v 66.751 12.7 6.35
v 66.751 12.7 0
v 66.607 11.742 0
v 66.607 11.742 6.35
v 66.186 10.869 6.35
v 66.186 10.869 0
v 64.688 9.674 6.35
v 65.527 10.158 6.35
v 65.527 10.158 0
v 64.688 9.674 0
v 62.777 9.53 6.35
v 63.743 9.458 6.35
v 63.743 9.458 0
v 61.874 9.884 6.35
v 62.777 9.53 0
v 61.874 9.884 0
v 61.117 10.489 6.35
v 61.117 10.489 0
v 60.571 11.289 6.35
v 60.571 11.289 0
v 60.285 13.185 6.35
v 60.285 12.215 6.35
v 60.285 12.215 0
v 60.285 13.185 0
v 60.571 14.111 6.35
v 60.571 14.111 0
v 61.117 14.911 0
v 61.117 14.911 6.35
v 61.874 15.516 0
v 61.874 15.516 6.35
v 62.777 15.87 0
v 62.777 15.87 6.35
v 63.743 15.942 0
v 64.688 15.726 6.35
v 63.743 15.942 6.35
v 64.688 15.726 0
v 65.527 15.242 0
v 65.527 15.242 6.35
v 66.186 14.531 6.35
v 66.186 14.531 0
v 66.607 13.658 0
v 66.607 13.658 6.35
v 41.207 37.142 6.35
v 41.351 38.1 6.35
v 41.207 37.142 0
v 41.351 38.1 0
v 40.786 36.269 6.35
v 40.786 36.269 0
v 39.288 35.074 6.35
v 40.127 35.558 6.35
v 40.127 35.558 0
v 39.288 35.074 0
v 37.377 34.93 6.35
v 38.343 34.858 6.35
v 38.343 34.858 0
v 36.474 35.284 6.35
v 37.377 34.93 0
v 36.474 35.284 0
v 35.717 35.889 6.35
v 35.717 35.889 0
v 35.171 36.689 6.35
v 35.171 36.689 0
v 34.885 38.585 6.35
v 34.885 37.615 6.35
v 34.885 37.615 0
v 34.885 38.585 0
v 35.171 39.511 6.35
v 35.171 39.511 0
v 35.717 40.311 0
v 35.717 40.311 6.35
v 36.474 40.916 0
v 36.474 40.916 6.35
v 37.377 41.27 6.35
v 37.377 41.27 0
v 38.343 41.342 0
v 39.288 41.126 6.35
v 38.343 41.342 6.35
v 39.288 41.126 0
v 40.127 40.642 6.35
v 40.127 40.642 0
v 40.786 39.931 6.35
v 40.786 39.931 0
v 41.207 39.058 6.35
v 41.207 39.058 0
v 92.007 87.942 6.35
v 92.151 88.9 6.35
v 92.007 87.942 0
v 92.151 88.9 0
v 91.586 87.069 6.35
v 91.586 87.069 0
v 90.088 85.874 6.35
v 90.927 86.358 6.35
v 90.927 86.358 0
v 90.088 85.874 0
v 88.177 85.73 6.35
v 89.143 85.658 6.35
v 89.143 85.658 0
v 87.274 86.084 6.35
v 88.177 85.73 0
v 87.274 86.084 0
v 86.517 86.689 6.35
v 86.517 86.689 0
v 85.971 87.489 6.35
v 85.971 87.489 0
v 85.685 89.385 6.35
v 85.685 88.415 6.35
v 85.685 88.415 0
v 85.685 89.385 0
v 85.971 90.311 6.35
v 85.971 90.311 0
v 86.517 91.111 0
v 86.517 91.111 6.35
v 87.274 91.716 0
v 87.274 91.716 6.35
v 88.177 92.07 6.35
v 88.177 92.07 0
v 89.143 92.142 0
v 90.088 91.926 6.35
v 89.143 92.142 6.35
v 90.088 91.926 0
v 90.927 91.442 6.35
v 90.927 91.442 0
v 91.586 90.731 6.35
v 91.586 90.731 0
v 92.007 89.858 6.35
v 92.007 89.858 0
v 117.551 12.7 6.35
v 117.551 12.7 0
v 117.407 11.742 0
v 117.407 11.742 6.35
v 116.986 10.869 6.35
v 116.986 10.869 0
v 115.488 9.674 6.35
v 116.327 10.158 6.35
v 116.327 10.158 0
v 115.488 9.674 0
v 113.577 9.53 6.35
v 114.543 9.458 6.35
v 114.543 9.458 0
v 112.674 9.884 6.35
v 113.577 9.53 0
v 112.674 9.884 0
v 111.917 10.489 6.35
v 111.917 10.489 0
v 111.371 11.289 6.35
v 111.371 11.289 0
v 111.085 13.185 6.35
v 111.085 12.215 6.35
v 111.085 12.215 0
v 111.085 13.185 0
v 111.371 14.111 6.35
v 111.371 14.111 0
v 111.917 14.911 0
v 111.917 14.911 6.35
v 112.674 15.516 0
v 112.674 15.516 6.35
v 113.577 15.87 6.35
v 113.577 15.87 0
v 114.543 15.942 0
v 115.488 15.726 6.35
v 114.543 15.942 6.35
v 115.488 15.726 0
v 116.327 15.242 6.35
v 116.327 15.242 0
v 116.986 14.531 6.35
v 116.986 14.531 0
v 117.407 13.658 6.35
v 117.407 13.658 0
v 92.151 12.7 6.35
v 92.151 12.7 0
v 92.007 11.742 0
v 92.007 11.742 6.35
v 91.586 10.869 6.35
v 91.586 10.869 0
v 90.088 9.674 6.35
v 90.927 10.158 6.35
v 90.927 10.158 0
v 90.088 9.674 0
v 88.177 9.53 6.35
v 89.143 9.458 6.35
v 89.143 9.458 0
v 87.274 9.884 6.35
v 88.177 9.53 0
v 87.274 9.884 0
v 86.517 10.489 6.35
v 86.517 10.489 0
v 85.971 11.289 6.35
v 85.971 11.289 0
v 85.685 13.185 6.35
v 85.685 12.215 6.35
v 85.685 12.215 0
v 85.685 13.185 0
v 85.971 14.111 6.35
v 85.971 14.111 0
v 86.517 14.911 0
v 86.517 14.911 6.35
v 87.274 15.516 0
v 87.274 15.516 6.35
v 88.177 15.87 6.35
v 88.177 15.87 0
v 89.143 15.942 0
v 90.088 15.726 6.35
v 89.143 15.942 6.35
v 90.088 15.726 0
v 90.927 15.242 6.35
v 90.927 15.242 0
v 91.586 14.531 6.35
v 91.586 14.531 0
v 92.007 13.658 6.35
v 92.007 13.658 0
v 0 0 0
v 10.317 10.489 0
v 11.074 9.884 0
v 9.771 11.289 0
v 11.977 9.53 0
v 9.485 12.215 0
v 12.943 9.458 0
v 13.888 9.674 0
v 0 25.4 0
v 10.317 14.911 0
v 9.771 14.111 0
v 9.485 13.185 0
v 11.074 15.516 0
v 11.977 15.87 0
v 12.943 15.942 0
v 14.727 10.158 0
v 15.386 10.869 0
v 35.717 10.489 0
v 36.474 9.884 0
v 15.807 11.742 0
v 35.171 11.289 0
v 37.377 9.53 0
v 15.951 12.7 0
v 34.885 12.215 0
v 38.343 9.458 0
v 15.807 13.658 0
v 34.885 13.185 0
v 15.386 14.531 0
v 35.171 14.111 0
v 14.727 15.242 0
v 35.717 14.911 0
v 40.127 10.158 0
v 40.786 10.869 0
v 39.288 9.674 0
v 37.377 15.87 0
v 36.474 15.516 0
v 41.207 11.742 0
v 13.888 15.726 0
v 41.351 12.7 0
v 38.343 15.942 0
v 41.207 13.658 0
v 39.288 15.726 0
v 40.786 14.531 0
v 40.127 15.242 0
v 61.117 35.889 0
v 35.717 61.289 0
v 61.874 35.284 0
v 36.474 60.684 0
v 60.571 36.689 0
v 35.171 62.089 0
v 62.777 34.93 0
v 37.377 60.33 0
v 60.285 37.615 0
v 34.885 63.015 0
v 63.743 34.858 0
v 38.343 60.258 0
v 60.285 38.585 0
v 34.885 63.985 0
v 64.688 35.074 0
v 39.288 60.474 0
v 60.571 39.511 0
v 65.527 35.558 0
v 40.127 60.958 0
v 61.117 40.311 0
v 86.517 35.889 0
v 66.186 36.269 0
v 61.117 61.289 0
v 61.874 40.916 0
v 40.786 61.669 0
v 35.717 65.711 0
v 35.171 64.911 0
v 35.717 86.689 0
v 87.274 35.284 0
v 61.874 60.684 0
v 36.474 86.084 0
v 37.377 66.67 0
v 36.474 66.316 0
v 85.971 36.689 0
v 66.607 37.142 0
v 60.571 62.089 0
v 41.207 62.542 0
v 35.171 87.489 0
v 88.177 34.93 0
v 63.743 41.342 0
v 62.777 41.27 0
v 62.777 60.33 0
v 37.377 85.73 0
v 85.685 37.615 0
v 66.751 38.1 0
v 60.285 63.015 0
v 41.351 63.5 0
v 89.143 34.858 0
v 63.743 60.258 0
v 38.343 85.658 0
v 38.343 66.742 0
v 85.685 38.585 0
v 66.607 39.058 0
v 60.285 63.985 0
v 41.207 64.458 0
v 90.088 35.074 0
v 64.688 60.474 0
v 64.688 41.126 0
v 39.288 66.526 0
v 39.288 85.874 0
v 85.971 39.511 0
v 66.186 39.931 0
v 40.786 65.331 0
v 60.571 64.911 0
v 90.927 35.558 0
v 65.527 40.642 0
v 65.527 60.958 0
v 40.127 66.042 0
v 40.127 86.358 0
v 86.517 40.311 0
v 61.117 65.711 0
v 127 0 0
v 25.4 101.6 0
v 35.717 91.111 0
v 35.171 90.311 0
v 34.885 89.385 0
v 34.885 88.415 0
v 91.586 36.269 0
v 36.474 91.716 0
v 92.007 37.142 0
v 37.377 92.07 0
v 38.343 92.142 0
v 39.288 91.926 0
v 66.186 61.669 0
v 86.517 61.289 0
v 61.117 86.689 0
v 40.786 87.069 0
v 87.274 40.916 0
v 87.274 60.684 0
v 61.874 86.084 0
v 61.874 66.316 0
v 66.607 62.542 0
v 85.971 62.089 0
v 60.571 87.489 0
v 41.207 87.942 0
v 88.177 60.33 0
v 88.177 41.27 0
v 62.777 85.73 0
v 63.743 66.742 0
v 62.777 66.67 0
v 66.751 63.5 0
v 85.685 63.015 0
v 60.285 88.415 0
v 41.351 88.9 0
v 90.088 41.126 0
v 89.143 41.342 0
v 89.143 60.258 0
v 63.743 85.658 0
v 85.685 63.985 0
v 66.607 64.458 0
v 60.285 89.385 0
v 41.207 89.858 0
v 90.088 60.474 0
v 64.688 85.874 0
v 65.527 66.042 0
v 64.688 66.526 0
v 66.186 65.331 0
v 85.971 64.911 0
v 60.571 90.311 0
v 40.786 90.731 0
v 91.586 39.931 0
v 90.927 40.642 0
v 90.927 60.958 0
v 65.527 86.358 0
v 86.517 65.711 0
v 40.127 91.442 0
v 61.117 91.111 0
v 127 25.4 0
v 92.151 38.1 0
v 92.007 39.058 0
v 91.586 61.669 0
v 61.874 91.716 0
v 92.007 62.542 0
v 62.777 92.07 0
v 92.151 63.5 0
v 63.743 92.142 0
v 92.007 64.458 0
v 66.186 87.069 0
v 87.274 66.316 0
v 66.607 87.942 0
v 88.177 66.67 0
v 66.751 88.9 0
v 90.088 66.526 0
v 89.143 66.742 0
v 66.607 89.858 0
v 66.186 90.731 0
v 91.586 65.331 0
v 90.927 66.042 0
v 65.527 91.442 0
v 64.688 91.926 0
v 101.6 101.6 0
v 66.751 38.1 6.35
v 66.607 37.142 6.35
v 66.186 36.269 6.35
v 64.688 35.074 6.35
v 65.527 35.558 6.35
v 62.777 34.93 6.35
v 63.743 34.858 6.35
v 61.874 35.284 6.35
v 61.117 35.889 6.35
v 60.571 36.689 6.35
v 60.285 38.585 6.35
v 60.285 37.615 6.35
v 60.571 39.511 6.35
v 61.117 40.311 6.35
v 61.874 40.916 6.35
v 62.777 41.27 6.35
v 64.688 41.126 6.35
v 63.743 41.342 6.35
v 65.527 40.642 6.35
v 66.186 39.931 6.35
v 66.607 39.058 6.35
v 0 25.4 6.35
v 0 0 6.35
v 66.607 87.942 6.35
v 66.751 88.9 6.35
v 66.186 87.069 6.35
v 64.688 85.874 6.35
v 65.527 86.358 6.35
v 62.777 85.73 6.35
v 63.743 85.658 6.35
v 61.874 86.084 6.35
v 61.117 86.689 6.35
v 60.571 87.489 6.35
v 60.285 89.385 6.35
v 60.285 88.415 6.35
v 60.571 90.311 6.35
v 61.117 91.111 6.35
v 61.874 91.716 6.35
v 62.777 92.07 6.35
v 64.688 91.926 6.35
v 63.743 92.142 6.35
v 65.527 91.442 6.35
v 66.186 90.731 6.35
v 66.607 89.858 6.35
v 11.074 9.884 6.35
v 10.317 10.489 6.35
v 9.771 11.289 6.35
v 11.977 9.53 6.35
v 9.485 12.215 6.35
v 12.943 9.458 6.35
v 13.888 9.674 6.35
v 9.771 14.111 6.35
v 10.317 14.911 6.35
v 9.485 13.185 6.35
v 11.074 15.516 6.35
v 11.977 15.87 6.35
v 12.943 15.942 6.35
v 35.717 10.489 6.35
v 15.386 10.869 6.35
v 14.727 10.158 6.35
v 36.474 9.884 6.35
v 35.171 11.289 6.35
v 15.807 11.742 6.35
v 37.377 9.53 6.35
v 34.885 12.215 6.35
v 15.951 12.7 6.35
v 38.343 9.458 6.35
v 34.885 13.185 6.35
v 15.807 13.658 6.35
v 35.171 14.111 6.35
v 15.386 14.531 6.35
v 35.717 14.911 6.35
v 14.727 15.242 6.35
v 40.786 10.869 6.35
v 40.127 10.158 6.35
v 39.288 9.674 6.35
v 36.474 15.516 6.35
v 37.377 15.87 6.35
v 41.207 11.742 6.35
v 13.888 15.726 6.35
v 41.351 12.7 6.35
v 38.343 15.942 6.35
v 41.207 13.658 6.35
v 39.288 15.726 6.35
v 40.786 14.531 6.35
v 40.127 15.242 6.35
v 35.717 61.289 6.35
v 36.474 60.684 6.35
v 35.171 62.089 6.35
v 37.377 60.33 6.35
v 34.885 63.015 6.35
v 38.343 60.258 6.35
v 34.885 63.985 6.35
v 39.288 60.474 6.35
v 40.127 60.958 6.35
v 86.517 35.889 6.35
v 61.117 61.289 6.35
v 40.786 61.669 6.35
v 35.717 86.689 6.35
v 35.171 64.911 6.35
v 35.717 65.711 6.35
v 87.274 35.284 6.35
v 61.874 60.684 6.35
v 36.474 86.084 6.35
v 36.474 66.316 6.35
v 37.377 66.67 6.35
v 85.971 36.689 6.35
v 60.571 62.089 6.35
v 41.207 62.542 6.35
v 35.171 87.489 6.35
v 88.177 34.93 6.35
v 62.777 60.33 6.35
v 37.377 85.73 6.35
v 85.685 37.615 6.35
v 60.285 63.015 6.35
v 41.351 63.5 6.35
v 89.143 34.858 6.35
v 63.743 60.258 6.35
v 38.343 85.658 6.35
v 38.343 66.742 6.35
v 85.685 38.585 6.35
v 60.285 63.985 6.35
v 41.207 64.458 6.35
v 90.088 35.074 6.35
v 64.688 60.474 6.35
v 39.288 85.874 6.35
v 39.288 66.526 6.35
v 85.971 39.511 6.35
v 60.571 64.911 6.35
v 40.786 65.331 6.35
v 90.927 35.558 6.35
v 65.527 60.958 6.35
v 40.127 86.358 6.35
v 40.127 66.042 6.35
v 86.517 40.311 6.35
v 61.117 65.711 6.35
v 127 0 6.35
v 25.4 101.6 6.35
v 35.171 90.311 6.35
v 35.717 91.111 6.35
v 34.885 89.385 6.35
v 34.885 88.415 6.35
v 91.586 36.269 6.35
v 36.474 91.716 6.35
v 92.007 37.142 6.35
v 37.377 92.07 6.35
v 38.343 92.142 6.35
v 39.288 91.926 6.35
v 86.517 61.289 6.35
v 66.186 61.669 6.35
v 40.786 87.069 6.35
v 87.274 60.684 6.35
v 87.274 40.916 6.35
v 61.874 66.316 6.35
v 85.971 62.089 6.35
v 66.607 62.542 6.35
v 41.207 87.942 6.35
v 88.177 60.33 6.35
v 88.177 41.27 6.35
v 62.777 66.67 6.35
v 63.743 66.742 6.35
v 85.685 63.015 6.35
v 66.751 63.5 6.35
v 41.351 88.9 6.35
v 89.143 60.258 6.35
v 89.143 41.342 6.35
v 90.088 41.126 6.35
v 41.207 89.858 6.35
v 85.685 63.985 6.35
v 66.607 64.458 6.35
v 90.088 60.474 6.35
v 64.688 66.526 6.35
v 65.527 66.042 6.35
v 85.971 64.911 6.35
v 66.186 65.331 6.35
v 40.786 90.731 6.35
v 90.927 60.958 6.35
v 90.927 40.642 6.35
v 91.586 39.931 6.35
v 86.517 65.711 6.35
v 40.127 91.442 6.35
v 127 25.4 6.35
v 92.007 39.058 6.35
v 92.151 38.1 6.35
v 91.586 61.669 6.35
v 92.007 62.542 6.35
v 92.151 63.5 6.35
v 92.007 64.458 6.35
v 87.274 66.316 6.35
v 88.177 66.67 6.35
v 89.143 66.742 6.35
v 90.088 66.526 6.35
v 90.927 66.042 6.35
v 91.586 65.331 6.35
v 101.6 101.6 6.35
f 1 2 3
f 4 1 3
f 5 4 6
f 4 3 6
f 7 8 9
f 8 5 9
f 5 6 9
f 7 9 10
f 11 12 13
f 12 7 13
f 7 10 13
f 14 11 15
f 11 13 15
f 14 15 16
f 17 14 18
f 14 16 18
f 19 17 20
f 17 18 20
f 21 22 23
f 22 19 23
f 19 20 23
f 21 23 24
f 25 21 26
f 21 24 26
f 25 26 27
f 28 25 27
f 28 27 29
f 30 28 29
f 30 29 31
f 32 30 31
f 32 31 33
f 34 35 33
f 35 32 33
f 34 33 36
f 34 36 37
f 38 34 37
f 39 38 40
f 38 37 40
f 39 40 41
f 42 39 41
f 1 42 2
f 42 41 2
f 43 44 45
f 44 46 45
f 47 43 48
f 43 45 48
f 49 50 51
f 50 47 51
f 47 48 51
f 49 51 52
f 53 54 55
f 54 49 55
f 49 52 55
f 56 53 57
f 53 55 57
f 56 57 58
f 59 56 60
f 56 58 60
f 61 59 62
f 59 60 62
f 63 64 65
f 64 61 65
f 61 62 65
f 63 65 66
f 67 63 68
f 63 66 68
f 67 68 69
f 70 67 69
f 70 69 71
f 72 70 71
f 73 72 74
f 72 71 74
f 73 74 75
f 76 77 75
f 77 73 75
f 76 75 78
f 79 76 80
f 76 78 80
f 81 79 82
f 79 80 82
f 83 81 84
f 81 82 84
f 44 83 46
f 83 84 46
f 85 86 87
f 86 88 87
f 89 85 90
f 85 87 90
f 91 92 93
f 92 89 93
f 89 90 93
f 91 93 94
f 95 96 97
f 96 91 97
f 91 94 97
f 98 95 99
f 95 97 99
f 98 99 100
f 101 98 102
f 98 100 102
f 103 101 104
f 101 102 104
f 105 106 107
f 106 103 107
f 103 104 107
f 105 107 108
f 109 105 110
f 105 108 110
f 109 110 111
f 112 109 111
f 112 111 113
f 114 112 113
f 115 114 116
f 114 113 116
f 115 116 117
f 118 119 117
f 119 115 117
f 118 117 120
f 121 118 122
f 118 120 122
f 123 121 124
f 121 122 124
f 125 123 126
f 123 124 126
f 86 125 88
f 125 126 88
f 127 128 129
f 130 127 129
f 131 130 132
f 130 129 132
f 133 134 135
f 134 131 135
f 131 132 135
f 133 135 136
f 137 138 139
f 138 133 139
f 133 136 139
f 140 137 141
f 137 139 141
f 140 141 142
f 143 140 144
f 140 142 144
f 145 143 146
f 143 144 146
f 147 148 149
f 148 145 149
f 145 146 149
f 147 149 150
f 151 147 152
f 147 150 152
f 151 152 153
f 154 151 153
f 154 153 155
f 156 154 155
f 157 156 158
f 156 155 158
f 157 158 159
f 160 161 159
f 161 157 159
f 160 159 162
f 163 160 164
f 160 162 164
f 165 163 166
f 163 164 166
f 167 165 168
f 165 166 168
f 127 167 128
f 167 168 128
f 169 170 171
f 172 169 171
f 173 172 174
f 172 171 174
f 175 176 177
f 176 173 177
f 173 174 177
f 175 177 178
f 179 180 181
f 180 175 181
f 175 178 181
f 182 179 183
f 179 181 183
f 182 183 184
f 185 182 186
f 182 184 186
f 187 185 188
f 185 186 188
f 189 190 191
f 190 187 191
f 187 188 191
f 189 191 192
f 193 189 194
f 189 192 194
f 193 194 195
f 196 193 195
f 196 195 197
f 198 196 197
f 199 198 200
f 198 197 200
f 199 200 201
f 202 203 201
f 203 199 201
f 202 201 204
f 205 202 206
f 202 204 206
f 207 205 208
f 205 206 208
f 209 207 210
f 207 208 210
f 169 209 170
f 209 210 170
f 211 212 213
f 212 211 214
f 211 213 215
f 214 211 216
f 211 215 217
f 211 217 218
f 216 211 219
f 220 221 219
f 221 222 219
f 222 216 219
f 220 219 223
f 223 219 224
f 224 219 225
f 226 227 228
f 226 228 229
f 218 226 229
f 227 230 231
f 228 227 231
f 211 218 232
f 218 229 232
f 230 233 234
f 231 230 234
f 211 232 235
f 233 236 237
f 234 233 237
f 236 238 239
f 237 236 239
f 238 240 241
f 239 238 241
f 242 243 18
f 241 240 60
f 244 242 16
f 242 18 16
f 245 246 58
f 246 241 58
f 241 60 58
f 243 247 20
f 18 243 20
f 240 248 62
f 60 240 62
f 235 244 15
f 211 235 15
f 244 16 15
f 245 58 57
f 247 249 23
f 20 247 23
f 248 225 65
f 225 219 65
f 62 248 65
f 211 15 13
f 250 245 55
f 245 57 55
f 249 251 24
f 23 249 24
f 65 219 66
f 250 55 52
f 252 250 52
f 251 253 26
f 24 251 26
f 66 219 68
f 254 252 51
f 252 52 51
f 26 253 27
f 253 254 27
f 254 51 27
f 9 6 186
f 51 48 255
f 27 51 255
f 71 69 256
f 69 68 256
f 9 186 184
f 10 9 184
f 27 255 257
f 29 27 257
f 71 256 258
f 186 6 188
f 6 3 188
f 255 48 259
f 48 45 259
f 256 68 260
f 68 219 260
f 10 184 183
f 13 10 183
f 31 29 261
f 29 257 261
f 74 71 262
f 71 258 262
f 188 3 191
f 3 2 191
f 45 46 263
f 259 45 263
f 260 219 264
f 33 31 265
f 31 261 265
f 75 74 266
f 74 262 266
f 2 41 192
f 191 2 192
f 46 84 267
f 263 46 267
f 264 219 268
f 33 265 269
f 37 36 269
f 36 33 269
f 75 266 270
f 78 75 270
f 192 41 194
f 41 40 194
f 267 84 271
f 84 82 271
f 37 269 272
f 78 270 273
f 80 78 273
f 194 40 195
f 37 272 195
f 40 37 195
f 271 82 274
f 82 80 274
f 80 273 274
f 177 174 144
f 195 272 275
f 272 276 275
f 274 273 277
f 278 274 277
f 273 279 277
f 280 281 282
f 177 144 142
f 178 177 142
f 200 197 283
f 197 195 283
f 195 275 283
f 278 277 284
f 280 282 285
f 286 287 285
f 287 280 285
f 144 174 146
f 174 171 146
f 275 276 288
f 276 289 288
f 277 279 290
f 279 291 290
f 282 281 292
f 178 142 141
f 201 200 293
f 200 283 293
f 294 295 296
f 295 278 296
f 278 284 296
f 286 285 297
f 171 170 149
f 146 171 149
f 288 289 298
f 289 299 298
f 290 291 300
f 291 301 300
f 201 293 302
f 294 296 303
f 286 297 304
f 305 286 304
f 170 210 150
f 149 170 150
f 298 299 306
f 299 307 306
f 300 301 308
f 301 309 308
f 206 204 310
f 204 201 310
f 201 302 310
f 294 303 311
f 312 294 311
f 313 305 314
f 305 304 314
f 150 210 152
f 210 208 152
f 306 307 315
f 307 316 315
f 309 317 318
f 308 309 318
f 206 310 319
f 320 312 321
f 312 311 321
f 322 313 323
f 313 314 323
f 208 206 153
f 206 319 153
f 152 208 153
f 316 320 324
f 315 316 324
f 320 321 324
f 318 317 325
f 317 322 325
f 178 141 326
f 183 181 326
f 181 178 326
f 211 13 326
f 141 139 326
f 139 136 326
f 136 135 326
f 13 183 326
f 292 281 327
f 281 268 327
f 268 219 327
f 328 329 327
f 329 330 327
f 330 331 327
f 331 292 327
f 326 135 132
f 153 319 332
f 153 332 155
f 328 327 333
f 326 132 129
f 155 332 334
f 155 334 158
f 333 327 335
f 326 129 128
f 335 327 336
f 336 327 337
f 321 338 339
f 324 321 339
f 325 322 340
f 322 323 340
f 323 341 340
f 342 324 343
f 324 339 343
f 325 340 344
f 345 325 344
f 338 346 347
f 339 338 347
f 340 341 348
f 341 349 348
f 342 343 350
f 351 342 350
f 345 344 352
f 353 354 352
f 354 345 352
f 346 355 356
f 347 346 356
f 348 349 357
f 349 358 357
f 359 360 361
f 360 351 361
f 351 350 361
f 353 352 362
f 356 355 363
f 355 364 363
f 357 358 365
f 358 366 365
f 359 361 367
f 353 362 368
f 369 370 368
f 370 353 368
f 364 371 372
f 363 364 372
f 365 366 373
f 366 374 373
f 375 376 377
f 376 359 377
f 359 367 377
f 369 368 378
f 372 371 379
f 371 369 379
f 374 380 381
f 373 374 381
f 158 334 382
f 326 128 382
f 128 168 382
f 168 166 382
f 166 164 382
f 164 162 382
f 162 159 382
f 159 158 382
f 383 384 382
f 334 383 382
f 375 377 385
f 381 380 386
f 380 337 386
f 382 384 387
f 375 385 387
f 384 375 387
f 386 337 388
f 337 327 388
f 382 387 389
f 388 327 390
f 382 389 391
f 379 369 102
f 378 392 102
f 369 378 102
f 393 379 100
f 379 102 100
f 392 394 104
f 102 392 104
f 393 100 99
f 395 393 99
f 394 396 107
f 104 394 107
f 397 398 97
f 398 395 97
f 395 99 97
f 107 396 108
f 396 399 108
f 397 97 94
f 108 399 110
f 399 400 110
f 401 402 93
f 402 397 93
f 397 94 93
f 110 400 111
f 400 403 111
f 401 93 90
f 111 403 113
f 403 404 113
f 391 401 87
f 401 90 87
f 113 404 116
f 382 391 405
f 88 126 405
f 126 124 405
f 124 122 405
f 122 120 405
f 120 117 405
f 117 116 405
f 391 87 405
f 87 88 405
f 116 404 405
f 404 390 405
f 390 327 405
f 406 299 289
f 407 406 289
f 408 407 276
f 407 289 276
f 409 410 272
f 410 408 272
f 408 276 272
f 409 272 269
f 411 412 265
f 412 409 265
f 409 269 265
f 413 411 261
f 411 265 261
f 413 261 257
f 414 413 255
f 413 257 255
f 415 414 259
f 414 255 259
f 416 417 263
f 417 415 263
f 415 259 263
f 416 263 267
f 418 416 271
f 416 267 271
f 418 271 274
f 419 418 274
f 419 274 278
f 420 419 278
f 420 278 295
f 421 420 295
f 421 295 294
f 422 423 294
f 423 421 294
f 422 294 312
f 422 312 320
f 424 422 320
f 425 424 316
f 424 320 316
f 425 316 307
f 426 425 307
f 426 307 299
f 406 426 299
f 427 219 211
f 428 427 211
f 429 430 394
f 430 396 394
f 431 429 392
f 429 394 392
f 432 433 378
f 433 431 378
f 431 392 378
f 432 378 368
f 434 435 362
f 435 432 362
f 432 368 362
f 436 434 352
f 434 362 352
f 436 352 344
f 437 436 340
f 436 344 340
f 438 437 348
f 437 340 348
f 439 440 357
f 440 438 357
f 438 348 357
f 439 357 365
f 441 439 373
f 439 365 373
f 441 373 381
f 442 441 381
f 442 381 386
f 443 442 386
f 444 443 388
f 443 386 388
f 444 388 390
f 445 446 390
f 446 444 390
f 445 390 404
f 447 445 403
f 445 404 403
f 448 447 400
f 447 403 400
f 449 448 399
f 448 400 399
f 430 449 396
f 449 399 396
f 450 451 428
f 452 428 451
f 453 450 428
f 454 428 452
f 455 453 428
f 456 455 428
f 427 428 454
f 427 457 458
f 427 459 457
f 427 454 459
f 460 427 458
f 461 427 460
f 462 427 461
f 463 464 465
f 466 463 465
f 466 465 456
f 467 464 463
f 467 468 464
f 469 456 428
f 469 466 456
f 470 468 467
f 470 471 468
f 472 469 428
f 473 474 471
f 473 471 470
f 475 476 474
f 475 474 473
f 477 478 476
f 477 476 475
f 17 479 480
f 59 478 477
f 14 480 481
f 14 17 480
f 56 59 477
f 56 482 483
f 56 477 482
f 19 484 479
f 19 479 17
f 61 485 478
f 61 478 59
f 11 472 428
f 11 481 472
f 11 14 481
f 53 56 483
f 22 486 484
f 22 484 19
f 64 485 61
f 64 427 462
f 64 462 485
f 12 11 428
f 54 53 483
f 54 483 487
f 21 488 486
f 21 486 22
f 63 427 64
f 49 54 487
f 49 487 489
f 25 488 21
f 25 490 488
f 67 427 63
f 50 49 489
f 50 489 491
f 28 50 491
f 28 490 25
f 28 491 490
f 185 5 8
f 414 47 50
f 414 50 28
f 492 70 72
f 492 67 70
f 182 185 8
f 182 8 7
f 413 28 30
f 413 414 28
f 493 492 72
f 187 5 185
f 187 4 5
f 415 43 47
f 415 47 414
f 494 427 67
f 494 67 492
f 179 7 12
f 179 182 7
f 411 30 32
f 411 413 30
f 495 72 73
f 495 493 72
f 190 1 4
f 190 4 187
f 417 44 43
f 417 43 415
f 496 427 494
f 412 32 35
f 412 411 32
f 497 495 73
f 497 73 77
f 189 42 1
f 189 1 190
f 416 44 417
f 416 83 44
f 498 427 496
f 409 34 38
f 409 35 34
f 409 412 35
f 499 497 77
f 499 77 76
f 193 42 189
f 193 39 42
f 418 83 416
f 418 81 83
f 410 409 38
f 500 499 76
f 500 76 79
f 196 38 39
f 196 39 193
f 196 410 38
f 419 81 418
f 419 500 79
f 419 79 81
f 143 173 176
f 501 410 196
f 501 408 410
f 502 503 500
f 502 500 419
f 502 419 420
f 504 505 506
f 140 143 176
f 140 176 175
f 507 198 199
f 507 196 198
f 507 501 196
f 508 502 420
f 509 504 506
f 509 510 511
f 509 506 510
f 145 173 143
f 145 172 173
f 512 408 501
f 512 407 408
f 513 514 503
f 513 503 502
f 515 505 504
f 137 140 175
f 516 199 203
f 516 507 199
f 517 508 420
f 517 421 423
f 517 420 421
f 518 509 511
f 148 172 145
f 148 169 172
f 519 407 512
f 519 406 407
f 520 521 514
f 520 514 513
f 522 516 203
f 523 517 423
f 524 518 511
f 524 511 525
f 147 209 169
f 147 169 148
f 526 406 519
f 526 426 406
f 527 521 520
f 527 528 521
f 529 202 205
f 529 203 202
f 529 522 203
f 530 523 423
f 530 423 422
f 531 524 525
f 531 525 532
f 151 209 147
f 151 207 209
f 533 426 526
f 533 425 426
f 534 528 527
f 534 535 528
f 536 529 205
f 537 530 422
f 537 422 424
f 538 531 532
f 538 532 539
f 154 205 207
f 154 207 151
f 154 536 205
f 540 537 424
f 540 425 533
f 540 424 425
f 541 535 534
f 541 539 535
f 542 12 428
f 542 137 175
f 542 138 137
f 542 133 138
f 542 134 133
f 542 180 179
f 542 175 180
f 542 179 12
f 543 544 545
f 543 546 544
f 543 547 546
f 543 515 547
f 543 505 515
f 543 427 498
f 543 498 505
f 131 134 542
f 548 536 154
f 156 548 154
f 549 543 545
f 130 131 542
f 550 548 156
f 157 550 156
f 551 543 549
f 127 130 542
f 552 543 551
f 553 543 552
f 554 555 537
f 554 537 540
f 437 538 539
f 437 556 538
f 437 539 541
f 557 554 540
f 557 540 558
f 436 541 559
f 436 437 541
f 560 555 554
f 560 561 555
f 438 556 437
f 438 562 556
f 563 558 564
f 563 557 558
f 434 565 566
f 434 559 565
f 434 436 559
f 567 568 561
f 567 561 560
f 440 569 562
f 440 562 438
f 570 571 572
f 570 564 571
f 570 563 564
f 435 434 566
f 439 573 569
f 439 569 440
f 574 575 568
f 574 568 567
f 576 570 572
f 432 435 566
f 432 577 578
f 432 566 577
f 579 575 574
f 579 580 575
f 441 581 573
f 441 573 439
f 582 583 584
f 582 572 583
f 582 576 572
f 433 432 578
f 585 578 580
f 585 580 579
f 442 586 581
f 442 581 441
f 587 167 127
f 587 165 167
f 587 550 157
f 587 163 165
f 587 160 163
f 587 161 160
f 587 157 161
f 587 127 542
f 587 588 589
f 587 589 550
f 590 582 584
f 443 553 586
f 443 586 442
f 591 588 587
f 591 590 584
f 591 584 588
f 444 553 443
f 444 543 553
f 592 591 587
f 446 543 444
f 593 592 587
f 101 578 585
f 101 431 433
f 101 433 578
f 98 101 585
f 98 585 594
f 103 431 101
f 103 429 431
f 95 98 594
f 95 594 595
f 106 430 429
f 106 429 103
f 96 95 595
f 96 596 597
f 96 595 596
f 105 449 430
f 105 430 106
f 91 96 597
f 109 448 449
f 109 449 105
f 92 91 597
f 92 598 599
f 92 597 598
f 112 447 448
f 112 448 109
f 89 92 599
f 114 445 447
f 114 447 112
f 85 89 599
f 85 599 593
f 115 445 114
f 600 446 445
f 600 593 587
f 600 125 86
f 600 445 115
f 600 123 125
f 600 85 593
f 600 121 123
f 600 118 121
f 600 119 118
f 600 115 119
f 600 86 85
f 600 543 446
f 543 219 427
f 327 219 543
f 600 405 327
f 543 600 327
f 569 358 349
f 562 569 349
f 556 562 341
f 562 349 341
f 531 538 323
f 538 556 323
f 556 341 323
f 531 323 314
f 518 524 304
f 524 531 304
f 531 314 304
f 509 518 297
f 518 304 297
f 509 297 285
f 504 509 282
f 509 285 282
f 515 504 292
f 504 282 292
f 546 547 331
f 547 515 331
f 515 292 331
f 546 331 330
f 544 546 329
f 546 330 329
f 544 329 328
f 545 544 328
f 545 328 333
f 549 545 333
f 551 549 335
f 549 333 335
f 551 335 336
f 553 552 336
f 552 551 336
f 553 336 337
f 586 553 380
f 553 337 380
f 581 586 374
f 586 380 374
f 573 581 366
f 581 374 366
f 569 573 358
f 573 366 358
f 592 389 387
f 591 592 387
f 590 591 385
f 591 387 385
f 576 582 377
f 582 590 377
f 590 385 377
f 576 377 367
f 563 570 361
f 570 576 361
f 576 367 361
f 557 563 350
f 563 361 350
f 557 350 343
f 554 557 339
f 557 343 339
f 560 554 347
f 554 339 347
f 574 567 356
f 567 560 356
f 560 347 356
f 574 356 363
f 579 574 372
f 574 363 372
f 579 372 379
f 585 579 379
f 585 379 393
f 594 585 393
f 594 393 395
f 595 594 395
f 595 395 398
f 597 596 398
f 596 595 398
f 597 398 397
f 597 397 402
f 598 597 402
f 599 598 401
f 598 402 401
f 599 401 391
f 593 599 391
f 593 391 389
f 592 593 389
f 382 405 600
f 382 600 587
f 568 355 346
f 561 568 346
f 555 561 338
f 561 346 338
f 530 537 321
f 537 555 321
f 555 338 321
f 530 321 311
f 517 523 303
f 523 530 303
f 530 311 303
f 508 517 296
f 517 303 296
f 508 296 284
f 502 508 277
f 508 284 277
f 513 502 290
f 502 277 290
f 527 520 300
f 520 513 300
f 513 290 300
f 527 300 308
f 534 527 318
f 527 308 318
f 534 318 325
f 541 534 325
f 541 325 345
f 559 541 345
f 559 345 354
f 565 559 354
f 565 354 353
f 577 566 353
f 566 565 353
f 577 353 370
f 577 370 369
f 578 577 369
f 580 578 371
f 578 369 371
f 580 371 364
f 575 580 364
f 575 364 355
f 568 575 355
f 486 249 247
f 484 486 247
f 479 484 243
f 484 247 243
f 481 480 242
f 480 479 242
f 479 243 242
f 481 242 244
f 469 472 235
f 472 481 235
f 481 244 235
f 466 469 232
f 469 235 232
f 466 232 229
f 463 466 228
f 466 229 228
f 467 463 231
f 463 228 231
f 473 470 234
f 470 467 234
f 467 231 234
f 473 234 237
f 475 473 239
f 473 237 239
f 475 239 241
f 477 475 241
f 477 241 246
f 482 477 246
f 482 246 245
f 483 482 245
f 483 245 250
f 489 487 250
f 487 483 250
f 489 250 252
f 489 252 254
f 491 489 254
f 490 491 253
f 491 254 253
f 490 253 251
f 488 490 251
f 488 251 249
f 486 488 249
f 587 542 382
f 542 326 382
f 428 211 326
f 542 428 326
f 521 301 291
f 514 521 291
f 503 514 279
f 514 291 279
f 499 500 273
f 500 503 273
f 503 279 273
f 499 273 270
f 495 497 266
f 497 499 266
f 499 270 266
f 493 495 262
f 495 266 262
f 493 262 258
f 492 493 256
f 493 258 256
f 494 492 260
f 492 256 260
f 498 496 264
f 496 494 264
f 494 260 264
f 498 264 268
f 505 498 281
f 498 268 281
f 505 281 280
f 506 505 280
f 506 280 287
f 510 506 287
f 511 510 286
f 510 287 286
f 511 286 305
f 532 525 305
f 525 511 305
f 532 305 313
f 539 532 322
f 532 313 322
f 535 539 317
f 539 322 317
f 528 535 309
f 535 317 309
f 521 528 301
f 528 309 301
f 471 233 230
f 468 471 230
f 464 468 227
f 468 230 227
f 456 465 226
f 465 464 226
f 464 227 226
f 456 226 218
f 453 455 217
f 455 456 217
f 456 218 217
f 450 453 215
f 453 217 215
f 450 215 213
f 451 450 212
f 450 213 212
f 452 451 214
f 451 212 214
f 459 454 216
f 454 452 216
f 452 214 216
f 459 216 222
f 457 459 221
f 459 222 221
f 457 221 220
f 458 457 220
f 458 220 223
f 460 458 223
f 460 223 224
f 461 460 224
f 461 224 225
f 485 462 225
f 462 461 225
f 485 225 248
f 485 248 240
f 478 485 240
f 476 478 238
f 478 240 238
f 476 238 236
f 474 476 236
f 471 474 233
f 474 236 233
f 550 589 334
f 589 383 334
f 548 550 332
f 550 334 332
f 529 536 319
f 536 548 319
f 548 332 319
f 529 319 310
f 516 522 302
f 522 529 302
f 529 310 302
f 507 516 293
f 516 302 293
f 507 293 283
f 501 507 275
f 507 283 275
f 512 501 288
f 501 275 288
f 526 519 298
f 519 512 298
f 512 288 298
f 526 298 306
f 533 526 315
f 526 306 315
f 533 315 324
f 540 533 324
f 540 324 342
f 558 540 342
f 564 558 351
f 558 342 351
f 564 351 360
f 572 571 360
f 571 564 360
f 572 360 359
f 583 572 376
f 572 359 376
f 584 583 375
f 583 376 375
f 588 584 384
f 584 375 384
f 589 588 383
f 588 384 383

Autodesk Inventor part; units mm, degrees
ref_plane "YZ Plane" through (0, 0, 0) normal (1, 0, 0) x (0, 1, 0)
ref_plane "XZ Plane" through (0, 0, 0) normal (0, 1, 0) x (-1, 0, 0)
ref_plane "XY Plane" through (0, 0, 0) normal (0, 0, 1) x (1, 0, 0)
sketch "Sketch1" plane through (0, 0, 0) normal (0, 0, 1) x (1, 0, 0)
  line L0 (0, 0) -> (127, 0)
  line L1 (127, 0) -> (127, 101.6)
  line L2 (101.6, 101.6) -> (0, 101.6)
  line L3 (0, 25.4) -> (0, 0)
  circle A0 centre (12.7, 12.7) radius 3.2512
  circle A1 centre (38.1, 12.7) radius 3.2512
  circle A2 centre (63.5, 12.7) radius 3.2512
  circle A3 centre (88.9, 12.7) radius 3.2512
  circle A4 centre (114.3, 12.7) radius 3.2512
  circle A5 centre (38.1, 38.1) radius 3.2512
  circle A6 centre (63.5, 38.1) radius 3.2512
  circle A7 centre (88.9, 38.1) radius 3.2512
  circle A8 centre (38.1, 63.5) radius 3.2512
  circle A9 centre (63.5, 63.5) radius 3.2512
  circle A10 centre (88.9, 63.5) radius 3.2512
  circle A11 centre (38.1, 88.9) radius 3.2512
  circle A12 centre (63.5, 88.9) radius 3.2512
  circle A13 centre (88.9, 88.9) radius 3.2512
  line L4 (0, 25.4) -> (25.4, 101.6)
  line L5 (101.6, 101.6) -> (127, 25.4)
  dimension "d2" = 127
  dimension "d3" = 101.6
  dimension "d4" = 6.5024
  dimension "d5" = 12.7
  dimension "d6" = 12.7
  dimension "d9" = 25.4
  dimension "d14" = 25.4
  dimension "d15" = 25.4
  dimension "d18" = 25.4
  dimension "d23" = 25.4
  dimension "d24" = 25.4
extrude "Extrusion1" add sketch "Sketch1" along normal blind 6.35
properties part number "3x1 T plate"
